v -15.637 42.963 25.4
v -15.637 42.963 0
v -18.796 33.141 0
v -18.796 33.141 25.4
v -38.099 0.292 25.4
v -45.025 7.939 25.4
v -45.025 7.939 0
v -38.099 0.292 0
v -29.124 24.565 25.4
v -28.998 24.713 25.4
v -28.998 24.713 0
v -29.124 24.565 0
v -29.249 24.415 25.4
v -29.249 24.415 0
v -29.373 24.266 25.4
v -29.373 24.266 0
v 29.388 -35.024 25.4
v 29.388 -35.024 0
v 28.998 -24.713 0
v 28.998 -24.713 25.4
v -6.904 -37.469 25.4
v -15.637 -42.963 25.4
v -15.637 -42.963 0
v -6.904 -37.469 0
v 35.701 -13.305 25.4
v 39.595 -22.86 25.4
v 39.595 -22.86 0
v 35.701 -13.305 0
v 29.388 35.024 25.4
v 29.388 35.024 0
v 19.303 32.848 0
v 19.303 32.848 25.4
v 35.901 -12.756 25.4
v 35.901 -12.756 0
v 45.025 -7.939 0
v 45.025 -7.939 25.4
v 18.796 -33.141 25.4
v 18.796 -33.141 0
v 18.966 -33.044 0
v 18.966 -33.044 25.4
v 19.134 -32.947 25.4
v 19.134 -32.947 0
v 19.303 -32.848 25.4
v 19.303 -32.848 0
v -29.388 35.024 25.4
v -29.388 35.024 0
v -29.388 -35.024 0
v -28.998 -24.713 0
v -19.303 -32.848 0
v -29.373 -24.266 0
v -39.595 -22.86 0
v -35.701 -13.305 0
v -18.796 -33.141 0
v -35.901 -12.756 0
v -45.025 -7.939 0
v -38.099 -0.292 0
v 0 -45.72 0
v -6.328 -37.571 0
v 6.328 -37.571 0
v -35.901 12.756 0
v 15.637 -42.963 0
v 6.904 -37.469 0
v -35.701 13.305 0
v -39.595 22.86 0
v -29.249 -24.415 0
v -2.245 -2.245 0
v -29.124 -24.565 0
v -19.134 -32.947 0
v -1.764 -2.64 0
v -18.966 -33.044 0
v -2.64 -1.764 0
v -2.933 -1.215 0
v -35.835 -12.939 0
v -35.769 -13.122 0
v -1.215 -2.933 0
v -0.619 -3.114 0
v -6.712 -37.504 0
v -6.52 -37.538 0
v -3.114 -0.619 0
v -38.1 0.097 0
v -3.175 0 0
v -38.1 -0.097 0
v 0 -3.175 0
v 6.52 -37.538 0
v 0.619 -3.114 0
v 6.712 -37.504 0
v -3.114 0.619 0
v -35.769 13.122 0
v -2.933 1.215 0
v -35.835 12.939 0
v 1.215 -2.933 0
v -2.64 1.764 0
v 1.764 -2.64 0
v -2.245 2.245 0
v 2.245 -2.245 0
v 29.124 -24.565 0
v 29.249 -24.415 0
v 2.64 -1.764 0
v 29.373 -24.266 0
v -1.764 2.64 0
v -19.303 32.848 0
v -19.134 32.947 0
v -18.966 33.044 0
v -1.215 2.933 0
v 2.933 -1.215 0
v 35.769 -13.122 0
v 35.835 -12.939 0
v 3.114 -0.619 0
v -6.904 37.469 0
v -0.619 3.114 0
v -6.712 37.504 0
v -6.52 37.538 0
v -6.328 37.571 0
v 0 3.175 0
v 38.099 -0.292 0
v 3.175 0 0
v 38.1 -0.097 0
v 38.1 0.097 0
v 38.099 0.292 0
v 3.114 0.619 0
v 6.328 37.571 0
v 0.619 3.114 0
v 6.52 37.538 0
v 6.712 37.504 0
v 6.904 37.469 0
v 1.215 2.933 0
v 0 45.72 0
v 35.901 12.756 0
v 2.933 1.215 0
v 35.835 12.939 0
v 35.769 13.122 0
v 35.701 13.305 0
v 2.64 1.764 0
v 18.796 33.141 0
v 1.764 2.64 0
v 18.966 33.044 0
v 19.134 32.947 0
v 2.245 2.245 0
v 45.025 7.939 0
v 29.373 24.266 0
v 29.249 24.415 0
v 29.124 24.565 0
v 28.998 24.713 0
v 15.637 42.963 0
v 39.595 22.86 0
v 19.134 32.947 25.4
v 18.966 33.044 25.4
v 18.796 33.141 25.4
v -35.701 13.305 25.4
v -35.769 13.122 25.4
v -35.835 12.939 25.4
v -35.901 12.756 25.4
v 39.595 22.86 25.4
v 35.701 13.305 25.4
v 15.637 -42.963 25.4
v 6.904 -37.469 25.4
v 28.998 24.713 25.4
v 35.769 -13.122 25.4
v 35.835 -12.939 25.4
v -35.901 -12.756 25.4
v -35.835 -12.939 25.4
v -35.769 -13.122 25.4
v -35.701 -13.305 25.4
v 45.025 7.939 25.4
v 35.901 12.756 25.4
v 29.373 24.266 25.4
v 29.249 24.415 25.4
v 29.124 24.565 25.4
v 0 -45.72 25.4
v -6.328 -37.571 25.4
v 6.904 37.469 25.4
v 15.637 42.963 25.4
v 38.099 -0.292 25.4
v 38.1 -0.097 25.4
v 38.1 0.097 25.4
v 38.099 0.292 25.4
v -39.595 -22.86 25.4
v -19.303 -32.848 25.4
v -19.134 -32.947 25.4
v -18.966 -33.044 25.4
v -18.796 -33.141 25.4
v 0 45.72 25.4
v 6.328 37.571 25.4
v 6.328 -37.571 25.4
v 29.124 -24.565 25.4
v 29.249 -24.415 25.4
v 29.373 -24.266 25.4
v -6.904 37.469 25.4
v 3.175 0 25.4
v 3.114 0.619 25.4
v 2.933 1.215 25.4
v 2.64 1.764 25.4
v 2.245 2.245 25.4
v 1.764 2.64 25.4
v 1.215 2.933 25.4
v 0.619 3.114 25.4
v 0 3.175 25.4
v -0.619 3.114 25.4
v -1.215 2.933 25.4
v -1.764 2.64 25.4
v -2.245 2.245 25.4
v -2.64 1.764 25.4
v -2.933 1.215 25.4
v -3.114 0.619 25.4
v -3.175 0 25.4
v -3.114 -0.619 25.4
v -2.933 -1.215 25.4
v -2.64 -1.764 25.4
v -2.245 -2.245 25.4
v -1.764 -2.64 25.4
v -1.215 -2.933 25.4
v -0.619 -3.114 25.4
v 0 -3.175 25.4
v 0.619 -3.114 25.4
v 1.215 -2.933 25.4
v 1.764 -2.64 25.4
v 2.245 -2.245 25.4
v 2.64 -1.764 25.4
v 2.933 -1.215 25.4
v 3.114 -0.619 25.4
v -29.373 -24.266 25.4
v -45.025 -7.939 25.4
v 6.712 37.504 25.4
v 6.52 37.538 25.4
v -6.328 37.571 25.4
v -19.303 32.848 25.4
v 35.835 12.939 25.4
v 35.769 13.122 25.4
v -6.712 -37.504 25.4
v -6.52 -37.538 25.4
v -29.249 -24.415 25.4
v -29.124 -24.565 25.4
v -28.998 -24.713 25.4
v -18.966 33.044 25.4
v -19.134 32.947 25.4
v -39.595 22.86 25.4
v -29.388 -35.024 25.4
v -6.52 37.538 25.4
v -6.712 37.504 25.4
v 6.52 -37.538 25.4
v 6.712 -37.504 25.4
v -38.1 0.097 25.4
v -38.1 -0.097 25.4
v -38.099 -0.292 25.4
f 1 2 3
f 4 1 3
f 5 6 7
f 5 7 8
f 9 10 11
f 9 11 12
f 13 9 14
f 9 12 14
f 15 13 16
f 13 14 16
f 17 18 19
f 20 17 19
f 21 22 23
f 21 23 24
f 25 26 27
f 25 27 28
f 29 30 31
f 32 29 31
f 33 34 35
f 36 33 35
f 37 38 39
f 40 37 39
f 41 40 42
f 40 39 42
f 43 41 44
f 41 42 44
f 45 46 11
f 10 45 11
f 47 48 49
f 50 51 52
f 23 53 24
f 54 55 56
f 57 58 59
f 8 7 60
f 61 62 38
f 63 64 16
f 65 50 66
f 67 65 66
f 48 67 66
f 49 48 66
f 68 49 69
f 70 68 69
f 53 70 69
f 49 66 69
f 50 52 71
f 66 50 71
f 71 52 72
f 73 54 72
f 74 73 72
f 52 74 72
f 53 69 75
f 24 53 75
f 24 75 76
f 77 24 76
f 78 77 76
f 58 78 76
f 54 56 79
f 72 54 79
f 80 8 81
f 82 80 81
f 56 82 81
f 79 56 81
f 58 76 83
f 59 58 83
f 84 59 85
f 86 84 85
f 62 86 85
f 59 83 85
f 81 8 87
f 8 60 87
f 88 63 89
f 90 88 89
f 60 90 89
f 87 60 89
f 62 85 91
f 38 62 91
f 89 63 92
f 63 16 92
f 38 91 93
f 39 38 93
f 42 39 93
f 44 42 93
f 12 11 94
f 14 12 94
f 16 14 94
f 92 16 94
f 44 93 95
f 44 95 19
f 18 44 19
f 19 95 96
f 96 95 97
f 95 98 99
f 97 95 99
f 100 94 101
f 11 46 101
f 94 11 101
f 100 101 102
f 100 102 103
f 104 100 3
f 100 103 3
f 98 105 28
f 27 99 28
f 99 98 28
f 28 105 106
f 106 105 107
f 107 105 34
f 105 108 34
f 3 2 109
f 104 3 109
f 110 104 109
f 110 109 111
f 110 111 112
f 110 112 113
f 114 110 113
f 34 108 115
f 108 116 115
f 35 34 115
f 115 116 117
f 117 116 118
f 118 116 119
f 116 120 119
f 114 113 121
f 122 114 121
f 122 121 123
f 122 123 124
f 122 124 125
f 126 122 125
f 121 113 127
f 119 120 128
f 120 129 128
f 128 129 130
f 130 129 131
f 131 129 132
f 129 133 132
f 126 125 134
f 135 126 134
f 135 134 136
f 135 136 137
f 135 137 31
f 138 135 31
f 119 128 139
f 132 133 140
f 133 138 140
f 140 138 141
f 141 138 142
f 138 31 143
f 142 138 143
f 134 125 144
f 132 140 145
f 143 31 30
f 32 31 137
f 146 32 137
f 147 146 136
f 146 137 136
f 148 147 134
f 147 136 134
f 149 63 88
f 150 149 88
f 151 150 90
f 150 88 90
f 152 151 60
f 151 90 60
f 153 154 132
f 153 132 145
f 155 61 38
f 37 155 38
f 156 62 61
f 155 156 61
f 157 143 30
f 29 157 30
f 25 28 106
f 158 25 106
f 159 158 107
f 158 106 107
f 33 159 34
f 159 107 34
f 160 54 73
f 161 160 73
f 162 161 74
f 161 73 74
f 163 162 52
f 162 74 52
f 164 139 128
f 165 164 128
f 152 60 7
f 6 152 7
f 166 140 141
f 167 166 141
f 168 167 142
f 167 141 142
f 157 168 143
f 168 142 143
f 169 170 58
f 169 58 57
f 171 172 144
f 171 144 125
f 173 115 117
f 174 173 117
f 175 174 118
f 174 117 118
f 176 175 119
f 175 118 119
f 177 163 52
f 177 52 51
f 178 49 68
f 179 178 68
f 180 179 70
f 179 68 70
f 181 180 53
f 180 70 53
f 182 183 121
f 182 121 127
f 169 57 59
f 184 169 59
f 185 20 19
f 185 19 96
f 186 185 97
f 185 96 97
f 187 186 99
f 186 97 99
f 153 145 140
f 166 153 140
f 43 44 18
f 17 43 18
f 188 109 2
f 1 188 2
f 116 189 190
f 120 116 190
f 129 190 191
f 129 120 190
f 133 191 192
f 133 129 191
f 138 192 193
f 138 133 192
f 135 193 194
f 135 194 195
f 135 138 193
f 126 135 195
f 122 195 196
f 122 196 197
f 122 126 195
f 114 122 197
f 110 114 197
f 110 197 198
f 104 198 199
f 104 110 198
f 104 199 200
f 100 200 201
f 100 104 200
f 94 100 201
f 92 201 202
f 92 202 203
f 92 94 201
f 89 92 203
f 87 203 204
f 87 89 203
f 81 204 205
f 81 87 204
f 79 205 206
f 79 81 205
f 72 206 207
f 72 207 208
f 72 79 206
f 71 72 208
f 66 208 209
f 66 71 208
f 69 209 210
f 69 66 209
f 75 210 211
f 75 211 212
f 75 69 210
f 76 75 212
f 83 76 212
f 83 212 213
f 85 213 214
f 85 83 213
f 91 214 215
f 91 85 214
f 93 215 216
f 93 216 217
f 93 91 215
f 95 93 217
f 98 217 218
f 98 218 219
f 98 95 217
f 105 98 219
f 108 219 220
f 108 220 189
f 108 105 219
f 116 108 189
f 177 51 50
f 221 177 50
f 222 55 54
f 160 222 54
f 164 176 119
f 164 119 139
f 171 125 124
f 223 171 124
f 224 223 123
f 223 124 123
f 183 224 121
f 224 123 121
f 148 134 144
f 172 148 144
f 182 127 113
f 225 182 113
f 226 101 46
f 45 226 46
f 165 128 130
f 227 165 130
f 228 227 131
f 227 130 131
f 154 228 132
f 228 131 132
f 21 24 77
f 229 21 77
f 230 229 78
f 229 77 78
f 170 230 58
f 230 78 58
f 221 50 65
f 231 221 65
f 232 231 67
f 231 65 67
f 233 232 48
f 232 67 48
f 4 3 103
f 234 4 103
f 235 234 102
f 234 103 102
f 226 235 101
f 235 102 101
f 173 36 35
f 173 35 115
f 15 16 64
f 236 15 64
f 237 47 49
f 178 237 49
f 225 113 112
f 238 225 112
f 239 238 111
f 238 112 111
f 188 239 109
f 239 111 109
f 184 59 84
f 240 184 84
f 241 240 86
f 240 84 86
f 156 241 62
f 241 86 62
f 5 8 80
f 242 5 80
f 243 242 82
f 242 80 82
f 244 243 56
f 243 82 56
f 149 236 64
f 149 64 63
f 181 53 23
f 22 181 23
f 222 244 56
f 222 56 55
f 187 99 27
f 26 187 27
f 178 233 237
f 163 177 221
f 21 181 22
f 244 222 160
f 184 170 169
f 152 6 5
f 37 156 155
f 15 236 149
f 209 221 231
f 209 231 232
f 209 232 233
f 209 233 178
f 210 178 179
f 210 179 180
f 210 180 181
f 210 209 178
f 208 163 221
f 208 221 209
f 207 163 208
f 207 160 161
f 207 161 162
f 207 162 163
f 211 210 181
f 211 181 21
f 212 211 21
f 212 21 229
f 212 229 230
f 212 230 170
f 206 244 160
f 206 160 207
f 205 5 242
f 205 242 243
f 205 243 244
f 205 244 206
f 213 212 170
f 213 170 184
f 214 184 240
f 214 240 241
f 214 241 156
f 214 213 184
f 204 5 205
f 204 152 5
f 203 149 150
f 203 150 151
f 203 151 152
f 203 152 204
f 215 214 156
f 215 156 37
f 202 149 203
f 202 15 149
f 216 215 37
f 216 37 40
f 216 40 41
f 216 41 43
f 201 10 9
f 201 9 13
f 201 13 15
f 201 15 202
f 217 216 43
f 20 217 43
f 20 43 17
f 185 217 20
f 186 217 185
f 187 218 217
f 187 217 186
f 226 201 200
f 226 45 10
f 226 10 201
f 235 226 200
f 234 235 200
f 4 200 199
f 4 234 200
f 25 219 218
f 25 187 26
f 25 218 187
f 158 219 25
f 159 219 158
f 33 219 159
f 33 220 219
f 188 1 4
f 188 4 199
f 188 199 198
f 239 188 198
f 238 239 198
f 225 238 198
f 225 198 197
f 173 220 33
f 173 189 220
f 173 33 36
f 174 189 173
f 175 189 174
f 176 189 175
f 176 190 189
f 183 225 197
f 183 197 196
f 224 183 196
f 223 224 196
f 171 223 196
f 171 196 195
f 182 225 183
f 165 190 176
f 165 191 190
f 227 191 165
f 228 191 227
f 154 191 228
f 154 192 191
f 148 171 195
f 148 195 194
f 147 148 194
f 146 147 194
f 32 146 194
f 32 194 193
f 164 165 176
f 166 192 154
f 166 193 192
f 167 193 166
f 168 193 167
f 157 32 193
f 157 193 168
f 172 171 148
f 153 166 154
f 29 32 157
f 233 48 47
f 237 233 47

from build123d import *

# Parameters (mm, degrees)
F0_R     = 3.175
F1_DEPTH = 25.4


with BuildPart() as f1:
    # F0 (on Top) → F1 (new body)
    with BuildSketch(Plane.XY):
        with BuildLine():
            Line((0, 45.72), (-6.327913, 37.570833))
            ThreePointArc((-6.327913, 37.570833), (-6.615996, 37.521175), (-6.903689, 37.469309))
            Line((-6.903689, 37.469309), (-15.637161, 42.962747))
            Line((-15.637161, 42.962747), (-18.796275, 33.140761))
            ThreePointArc((-18.796275, 33.140761), (-19.05, 32.995568), (-19.302604, 32.848432))
            Line((-19.302604, 32.848432), (-29.38825, 35.023552))
            Line((-29.38825, 35.023552), (-28.997529, 24.713424))
            ThreePointArc((-28.997529, 24.713424), (-29.186293, 24.490208), (-29.37334, 24.26555))
            Line((-29.37334, 24.26555), (-39.594681, 22.86))
            Line((-39.594681, 22.86), (-35.701253, 13.305283))
            ThreePointArc((-35.701253, 13.305283), (-35.802289, 13.030967), (-35.901217, 12.755885))
            Line((-35.901217, 12.755885), (-45.02541, 7.939195))
            Line((-45.02541, 7.939195), (-38.098879, 0.292329))
            ThreePointArc((-38.098879, 0.292329), (-38.1, 0), (-38.098879, -0.292329))
            Line((-38.098879, -0.292329), (-45.02541, -7.939195))
            Line((-45.02541, -7.939195), (-35.901217, -12.755885))
            ThreePointArc((-35.901217, -12.755885), (-35.802289, -13.030967), (-35.701253, -13.305283))
            Line((-35.701253, -13.305283), (-39.594681, -22.86))
            Line((-39.594681, -22.86), (-29.37334, -24.26555))
            ThreePointArc((-29.37334, -24.26555), (-29.186293, -24.490208), (-28.997529, -24.713424))
            Line((-28.997529, -24.713424), (-29.38825, -35.023552))
            Line((-29.38825, -35.023552), (-19.302604, -32.848432))
            ThreePointArc((-19.302604, -32.848432), (-19.05, -32.995568), (-18.796275, -33.140761))
            Line((-18.796275, -33.140761), (-15.637161, -42.962747))
            Line((-15.637161, -42.962747), (-6.903689, -37.469309))
            ThreePointArc((-6.903689, -37.469309), (-6.615996, -37.521175), (-6.327913, -37.570833))
            Line((-6.327913, -37.570833), (0, -45.72))
            Line((0, -45.72), (6.327913, -37.570833))
            ThreePointArc((6.327913, -37.570833), (6.615996, -37.521175), (6.903689, -37.469309))
            Line((6.903689, -37.469309), (15.637161, -42.962747))
            Line((15.637161, -42.962747), (18.796275, -33.140761))
            ThreePointArc((18.796275, -33.140761), (19.05, -32.995568), (19.302604, -32.848432))
            Line((19.302604, -32.848432), (29.38825, -35.023552))
            Line((29.38825, -35.023552), (28.997529, -24.713424))
            ThreePointArc((28.997529, -24.713424), (29.186293, -24.490208), (29.37334, -24.26555))
            Line((29.37334, -24.26555), (39.594681, -22.86))
            Line((39.594681, -22.86), (35.701253, -13.305283))
            ThreePointArc((35.701253, -13.305283), (35.802289, -13.030967), (35.901217, -12.755885))
            Line((35.901217, -12.755885), (45.02541, -7.939195))
            Line((45.02541, -7.939195), (38.098879, -0.292329))
            ThreePointArc((38.098879, -0.292329), (38.1, 0), (38.098879, 0.292329))
            Line((38.098879, 0.292329), (45.02541, 7.939195))
            Line((45.02541, 7.939195), (35.901217, 12.755885))
            ThreePointArc((35.901217, 12.755885), (35.802289, 13.030967), (35.701253, 13.305283))
            Line((35.701253, 13.305283), (39.594681, 22.86))
            Line((39.594681, 22.86), (29.37334, 24.26555))
            ThreePointArc((29.37334, 24.26555), (29.186293, 24.490208), (28.997529, 24.713424))
            Line((28.997529, 24.713424), (29.38825, 35.023552))
            Line((29.38825, 35.023552), (19.302604, 32.848432))
            ThreePointArc((19.302604, 32.848432), (19.05, 32.995568), (18.796275, 33.140761))
            Line((18.796275, 33.140761), (15.637161, 42.962747))
            Line((15.637161, 42.962747), (6.903689, 37.469309))
            ThreePointArc((6.903689, 37.469309), (6.615996, 37.521175), (6.327913, 37.570833))
            Line((6.327913, 37.570833), (0, 45.72))
        make_face()
        Circle(F0_R, mode=Mode.SUBTRACT)
    extrude(amount=F1_DEPTH)


solid = f1.part
